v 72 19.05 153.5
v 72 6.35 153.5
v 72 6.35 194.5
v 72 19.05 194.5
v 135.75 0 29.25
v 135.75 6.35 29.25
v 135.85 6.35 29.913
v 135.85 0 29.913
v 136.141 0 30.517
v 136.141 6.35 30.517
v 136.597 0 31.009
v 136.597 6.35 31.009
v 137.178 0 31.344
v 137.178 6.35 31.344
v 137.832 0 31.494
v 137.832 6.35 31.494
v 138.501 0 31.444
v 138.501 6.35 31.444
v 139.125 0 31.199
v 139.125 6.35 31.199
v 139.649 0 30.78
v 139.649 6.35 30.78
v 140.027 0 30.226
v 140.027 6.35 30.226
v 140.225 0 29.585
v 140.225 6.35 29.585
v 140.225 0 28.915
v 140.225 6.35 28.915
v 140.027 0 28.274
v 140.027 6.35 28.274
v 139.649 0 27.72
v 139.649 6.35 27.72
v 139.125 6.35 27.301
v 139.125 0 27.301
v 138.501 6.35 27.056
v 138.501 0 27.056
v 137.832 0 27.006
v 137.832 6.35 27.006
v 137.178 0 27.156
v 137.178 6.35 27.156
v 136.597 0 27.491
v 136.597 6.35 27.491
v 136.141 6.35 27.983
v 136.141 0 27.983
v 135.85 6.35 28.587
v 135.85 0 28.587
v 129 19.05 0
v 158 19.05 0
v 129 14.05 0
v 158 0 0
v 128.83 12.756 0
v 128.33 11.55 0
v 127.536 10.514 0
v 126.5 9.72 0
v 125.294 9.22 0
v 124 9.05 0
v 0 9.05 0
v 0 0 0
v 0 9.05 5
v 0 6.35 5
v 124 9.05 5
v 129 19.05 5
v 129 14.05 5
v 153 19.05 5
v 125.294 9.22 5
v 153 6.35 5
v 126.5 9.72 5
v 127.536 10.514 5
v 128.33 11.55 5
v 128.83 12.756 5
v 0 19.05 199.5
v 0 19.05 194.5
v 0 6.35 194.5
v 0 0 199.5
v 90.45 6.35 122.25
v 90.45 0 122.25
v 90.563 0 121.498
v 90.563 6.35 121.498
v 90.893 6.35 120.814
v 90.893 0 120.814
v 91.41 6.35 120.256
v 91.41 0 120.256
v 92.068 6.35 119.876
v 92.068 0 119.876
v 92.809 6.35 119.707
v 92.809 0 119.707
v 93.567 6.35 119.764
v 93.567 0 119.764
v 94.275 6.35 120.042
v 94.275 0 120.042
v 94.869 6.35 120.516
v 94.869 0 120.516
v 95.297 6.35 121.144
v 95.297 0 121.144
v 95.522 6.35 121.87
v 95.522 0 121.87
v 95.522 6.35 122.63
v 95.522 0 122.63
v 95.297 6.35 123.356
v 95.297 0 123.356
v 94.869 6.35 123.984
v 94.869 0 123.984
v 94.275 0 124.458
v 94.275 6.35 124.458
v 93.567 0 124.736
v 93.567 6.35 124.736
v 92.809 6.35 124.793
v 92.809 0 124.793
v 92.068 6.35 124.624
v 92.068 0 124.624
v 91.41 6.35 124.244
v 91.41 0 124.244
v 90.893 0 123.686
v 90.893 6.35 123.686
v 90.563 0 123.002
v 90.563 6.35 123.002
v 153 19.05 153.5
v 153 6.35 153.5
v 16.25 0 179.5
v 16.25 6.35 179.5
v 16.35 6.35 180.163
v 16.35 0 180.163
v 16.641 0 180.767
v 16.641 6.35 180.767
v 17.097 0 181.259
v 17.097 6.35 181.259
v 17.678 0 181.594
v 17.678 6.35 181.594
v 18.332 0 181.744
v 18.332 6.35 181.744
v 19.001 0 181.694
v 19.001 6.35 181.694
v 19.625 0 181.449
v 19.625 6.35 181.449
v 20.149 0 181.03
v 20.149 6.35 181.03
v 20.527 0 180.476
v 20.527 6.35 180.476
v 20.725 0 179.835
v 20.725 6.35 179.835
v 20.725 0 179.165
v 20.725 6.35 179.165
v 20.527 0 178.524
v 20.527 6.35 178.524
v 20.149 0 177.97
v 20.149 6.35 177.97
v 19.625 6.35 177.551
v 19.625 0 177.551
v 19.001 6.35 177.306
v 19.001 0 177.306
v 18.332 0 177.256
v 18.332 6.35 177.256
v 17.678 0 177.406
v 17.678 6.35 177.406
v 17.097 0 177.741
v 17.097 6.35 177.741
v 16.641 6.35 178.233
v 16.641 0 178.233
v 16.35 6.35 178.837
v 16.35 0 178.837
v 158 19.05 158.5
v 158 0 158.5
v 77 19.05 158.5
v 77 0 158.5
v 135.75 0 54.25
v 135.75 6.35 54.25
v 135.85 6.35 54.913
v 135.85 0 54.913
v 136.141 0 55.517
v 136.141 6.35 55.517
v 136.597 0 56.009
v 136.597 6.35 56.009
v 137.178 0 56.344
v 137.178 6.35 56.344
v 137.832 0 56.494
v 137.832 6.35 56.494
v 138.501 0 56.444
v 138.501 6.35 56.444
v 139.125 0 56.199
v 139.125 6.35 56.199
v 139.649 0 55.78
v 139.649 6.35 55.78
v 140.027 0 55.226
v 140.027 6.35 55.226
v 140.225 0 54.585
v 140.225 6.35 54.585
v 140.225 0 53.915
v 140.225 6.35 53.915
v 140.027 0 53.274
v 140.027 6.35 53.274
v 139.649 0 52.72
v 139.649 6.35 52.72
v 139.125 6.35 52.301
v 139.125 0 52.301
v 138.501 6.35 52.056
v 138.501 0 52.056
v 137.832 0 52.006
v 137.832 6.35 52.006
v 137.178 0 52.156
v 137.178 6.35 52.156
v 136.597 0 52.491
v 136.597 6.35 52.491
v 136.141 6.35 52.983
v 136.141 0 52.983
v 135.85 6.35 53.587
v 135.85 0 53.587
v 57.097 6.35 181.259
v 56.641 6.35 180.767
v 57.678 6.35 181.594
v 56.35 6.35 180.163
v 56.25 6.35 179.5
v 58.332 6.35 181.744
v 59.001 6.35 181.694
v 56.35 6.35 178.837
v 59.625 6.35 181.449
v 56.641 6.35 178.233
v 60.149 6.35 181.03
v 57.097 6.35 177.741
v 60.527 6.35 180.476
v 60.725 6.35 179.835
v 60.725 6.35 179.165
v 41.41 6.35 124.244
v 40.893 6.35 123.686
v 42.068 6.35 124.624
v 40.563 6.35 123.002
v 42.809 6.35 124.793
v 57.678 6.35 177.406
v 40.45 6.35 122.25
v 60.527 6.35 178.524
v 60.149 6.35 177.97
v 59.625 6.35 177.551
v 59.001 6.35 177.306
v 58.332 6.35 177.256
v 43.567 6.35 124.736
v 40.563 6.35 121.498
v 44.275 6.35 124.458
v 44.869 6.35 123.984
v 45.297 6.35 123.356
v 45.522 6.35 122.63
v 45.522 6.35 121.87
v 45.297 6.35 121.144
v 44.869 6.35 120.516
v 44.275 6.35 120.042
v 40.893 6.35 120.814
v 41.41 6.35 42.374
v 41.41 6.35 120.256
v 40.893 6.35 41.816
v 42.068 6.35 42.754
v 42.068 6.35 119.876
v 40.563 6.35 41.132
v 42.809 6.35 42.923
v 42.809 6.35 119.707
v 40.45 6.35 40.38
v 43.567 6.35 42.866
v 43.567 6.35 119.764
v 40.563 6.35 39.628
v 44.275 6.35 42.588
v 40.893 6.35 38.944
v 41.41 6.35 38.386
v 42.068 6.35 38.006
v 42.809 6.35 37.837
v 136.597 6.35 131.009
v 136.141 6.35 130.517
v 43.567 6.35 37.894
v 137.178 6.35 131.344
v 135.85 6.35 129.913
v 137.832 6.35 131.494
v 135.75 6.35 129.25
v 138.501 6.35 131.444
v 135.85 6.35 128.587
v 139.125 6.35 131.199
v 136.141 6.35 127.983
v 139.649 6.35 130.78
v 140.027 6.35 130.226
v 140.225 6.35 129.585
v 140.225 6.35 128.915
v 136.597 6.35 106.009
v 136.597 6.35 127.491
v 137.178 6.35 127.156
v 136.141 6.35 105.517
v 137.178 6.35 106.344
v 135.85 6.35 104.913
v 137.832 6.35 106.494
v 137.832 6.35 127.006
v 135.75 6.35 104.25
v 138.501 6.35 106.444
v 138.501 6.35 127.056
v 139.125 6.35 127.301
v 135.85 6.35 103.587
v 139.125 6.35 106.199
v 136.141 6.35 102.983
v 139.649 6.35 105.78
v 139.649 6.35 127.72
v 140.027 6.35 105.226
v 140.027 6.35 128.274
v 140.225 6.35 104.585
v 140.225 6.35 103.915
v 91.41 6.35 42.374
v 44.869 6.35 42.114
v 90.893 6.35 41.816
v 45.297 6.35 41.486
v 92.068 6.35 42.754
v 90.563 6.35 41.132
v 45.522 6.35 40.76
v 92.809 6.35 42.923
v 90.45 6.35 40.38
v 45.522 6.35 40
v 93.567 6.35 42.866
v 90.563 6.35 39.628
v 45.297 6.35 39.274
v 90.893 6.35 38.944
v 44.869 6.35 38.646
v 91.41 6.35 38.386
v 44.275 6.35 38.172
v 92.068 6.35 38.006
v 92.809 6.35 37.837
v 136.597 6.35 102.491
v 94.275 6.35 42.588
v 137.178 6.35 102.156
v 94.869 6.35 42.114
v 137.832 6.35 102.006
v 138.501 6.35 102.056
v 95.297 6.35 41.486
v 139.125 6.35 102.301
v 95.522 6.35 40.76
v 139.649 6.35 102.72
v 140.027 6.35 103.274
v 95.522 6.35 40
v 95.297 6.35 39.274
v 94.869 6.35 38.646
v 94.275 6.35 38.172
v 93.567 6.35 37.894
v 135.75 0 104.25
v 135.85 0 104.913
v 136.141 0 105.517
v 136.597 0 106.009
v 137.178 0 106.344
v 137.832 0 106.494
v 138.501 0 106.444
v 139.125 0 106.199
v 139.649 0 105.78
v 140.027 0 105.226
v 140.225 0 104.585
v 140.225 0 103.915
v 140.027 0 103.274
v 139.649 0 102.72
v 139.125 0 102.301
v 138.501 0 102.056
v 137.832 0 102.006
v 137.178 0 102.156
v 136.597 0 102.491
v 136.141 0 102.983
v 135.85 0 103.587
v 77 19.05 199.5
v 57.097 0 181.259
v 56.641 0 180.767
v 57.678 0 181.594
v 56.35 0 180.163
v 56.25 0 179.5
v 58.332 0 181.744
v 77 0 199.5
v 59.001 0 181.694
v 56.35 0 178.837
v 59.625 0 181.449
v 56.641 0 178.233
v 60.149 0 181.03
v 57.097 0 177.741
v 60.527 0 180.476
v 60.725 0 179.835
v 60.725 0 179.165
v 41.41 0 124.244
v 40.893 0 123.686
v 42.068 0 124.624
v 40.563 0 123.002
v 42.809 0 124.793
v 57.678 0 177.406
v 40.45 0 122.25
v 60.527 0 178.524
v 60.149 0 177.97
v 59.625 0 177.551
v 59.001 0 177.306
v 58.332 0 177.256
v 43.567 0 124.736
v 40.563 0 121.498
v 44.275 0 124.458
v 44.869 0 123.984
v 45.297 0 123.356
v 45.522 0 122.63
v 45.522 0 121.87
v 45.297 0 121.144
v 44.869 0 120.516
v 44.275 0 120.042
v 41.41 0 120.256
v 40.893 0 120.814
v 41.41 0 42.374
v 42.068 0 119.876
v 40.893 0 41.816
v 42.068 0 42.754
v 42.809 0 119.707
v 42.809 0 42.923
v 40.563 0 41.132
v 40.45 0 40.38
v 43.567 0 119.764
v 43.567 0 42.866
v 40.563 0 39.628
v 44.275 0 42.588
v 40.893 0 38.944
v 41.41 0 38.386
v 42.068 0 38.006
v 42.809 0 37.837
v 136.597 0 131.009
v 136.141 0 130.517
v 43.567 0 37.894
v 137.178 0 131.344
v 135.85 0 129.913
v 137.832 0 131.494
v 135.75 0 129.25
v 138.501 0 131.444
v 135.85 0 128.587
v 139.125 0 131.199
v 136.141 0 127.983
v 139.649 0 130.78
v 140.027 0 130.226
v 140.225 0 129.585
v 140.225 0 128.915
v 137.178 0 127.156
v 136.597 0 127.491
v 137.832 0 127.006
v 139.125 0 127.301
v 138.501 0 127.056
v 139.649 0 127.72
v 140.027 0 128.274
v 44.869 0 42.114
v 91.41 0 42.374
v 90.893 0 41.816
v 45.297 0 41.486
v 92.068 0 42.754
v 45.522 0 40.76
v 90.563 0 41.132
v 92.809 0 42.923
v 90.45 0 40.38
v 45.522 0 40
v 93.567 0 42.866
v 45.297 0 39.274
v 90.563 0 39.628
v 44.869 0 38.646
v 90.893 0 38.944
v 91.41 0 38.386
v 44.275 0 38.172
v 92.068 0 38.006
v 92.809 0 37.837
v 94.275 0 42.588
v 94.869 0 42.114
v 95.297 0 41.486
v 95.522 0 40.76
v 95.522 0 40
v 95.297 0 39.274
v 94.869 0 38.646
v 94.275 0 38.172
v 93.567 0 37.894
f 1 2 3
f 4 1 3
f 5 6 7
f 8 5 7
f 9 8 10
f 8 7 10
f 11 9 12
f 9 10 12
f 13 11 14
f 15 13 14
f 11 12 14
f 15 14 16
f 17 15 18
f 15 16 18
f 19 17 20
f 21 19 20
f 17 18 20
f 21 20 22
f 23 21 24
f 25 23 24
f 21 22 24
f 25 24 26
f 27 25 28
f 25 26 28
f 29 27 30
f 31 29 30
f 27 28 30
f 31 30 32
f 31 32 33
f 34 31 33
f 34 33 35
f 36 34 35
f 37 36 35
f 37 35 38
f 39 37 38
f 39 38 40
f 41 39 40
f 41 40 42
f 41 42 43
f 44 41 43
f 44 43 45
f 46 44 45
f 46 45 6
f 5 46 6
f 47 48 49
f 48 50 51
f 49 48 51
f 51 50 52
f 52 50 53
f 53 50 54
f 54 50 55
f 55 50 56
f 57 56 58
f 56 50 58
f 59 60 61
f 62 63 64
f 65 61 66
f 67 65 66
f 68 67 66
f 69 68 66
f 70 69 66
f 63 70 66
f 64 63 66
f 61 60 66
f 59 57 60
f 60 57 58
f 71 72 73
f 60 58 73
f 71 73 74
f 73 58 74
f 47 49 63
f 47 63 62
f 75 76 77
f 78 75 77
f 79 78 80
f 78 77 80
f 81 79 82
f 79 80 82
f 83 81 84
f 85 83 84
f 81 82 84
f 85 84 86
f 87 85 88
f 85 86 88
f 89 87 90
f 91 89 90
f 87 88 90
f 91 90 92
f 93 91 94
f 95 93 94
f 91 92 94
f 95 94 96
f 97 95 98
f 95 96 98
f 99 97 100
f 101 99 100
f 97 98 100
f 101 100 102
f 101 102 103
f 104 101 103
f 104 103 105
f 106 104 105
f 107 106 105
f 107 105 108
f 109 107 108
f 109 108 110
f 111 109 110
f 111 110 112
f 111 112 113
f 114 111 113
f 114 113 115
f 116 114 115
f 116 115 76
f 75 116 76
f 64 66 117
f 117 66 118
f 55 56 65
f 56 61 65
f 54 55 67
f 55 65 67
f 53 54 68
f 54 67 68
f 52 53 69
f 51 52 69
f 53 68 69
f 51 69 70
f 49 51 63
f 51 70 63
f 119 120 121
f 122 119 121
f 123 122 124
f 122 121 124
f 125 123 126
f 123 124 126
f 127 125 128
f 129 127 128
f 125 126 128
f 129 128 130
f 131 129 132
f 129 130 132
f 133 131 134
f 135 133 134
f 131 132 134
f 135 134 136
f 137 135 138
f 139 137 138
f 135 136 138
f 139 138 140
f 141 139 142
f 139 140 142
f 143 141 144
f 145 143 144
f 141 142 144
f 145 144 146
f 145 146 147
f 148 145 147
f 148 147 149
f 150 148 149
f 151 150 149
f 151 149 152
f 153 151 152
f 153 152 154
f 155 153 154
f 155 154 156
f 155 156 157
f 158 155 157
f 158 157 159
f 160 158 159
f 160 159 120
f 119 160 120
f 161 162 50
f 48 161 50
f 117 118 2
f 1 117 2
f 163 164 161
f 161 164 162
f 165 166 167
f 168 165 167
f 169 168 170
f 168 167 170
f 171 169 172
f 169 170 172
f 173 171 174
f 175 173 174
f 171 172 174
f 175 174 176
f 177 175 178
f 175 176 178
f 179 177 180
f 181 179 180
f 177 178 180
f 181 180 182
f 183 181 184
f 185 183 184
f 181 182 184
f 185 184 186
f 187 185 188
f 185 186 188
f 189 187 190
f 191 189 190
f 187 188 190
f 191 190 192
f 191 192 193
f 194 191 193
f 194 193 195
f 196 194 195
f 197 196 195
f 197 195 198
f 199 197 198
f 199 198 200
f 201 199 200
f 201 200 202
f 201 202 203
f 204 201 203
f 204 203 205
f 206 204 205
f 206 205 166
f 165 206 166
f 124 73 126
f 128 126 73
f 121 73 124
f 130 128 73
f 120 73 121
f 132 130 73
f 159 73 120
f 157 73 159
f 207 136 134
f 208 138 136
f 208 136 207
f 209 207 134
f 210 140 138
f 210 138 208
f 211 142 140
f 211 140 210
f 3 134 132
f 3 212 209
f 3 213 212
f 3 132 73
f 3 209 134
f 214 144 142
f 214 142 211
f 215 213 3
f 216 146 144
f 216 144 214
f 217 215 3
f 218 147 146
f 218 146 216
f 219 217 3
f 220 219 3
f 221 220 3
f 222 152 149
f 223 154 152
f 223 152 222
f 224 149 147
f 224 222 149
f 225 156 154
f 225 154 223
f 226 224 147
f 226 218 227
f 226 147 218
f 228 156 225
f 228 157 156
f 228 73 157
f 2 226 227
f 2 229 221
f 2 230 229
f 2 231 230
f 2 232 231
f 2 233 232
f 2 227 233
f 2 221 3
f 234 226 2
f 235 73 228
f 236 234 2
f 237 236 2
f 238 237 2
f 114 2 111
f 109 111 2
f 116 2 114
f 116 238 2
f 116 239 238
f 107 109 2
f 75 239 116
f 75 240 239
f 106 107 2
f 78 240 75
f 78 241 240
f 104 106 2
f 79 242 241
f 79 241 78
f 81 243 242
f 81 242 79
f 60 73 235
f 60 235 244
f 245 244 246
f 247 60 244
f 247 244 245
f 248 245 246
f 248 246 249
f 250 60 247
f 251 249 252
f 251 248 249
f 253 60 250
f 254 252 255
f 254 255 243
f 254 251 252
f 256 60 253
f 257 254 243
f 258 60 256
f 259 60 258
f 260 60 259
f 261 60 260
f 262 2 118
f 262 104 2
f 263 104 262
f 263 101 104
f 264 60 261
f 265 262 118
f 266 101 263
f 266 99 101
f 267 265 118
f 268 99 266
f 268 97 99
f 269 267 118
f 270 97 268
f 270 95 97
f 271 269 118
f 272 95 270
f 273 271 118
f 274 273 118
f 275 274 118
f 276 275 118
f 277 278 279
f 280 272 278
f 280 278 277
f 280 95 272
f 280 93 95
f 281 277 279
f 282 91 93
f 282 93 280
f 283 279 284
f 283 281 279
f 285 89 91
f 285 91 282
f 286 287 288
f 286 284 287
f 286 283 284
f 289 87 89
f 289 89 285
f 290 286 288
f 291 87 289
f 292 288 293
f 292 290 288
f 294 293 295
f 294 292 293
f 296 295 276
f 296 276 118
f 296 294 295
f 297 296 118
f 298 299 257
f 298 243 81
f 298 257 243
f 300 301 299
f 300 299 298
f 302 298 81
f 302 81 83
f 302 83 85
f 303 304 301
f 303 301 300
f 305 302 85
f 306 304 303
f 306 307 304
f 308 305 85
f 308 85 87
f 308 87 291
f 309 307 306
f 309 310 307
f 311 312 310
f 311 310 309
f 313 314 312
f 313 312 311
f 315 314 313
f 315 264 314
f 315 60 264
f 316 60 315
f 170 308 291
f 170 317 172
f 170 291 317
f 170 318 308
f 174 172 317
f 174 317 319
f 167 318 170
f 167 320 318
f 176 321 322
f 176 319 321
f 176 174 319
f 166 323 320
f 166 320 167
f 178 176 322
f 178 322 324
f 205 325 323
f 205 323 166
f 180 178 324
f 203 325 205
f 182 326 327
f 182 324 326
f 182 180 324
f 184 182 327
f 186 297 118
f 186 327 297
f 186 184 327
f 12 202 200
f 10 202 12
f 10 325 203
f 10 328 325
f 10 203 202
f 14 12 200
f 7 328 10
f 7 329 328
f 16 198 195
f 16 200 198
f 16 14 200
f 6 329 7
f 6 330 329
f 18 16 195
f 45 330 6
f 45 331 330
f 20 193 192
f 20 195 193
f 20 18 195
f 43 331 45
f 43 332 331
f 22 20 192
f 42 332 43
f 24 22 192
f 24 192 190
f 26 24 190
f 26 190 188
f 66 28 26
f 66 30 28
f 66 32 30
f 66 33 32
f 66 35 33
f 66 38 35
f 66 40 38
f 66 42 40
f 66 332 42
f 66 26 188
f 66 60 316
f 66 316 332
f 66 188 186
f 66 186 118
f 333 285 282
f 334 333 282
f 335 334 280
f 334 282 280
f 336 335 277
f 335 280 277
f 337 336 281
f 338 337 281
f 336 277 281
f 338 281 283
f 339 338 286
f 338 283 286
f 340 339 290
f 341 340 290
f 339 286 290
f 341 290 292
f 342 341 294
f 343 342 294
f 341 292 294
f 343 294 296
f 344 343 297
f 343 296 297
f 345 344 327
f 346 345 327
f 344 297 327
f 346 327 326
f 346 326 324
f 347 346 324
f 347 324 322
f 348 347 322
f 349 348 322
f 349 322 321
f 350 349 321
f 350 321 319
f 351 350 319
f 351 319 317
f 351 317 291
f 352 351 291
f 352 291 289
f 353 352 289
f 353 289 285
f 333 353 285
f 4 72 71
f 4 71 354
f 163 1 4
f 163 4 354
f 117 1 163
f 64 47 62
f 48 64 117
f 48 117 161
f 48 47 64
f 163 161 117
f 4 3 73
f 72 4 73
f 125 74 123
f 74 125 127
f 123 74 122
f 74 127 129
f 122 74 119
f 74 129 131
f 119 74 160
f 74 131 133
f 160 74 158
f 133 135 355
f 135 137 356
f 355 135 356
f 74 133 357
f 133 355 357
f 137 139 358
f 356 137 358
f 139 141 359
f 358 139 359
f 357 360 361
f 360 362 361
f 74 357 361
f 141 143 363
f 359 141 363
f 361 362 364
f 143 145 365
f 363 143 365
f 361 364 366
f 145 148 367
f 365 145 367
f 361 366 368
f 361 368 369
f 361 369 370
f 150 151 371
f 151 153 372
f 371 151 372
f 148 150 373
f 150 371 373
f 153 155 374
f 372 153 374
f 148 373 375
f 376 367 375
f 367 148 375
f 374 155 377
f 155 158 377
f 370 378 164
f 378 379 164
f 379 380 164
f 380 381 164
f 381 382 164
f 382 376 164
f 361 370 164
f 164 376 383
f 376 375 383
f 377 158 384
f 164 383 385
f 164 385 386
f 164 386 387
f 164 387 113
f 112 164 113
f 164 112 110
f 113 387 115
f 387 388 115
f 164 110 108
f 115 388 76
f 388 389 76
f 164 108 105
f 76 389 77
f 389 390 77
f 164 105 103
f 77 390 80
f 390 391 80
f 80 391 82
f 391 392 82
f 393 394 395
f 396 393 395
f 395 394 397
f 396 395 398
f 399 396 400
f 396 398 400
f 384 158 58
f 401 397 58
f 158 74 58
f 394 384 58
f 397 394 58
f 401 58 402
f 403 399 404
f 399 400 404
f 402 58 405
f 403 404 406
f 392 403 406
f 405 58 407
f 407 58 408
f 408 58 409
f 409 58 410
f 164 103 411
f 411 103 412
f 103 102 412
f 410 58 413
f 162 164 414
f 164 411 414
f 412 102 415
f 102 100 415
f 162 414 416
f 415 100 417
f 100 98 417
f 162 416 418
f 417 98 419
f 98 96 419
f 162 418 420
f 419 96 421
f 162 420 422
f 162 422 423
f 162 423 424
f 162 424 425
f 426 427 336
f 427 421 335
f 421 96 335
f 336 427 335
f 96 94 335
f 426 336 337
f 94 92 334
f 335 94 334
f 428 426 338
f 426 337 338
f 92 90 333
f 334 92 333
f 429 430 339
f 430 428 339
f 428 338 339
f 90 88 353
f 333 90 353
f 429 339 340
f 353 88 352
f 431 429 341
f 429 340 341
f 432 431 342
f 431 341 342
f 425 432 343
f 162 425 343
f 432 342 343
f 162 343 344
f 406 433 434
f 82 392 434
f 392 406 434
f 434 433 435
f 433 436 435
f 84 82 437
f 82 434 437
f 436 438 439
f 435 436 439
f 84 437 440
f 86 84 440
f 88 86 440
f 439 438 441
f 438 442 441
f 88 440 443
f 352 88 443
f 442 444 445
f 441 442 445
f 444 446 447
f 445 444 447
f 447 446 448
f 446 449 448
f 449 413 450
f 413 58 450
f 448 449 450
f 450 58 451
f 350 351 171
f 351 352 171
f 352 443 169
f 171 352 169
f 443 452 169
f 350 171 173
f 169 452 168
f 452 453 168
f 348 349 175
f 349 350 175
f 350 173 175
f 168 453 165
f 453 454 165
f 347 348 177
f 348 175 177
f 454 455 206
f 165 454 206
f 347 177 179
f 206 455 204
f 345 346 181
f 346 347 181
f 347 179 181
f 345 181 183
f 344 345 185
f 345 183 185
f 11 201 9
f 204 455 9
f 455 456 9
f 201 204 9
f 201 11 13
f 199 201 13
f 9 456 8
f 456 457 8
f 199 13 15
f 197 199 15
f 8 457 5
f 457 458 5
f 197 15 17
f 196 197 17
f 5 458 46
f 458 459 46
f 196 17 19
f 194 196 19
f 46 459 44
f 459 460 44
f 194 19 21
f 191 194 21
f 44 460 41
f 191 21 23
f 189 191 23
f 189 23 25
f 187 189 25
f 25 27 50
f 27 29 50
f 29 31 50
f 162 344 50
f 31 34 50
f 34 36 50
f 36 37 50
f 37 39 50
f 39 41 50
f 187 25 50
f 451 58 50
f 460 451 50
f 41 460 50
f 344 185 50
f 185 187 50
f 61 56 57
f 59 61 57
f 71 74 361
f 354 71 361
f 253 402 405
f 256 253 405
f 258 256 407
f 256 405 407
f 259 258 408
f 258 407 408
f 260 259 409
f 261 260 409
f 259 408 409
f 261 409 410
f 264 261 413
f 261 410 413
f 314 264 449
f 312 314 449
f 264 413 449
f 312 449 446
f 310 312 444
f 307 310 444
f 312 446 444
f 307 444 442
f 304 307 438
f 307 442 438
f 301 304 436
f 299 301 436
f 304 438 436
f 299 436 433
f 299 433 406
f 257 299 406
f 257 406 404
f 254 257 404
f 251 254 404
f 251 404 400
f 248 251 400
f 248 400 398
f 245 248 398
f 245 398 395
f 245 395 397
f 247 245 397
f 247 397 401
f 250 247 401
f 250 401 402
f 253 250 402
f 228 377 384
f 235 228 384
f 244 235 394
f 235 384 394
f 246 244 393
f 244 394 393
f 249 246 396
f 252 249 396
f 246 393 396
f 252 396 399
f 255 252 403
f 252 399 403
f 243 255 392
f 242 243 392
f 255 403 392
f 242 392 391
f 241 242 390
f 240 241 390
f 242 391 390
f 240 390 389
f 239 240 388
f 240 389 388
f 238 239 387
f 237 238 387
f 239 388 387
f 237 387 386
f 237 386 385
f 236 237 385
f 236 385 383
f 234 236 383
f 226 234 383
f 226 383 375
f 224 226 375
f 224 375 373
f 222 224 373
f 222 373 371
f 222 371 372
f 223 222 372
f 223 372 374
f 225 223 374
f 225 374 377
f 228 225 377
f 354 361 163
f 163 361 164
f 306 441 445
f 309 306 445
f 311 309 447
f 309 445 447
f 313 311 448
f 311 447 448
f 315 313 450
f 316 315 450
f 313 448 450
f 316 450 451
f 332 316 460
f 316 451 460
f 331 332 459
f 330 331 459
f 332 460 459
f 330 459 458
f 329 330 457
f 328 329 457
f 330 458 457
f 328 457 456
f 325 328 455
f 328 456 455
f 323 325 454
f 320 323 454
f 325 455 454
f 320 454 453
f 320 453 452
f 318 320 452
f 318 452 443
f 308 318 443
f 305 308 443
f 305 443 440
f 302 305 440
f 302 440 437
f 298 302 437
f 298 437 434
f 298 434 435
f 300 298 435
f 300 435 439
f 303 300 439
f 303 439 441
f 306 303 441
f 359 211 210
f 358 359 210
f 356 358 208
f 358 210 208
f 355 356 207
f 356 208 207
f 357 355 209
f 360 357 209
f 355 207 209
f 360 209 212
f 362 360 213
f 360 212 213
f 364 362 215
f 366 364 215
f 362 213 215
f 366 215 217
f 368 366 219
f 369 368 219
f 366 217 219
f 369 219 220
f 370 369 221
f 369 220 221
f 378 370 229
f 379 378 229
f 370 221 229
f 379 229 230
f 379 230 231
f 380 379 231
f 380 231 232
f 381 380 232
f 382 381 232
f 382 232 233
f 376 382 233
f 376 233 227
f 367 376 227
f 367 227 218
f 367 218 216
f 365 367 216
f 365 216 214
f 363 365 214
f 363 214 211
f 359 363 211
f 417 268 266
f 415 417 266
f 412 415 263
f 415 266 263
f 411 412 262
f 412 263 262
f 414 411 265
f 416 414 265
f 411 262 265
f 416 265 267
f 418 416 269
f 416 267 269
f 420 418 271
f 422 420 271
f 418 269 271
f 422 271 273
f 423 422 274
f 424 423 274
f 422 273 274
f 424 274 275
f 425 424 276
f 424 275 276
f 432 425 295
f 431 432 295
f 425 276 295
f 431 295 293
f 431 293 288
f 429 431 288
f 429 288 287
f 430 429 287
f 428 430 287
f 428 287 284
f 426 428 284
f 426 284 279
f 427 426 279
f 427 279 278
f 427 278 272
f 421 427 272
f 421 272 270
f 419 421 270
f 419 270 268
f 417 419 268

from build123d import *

# Parameters (mm, degrees)
SKETCH1_W                      = 158
SKETCH1_H                      = 199.5
BOSS_EXTRUDE1_DEPTH            = 6.35
SKETCH2_W                      = 81
SKETCH2_H                      = 41
CUT_EXTRUDE1_DEPTH             = 7.35
BOSS_EXTRUDE2_DEPTH            = 12.7
M4_CLEARANCE_HOLE1_D           = 4.5
M4_CLEARANCE_HOLE1_DEPTH       = 6.35
CUT_EXTRUDE2_REACH             = 201.5
SKETCH7_W                      = 129
SKETCH7_H                      = 10
FILLET1_R                      = 5
F_5_1_5_1_DIAMETER_HOLE1_D     = 5.1
F_5_1_5_1_DIAMETER_HOLE1_DEPTH = 6.35


with BuildPart() as part:
    # Sketch1 → Boss-Extrude1 (new body)
    with BuildSketch(Plane(origin=(0, 0, 0), x_dir=(1, 0, 0), z_dir=(0, 1, 0))):
        with Locations((79, -99.75)):
            Rectangle(SKETCH1_W, SKETCH1_H)
    extrude(amount=BOSS_EXTRUDE1_DEPTH)

    # Sketch2 → Cut-Extrude1 (cut, through all)
    with BuildSketch(Plane(origin=(0, 6.35, 0), x_dir=(1, 0, 0), z_dir=(0, 1, 0))):
        with Locations((117.5, -179)):
            Rectangle(SKETCH2_W, SKETCH2_H)
    extrude(amount=-CUT_EXTRUDE1_DEPTH, mode=Mode.SUBTRACT)

    # Sketch3 → Boss-Extrude2 (add)
    with BuildSketch(Plane(origin=(0, 6.35, 0), x_dir=(1, 0, 0), z_dir=(0, 1, 0))):
        Polygon((0, 0), (0, -5), (153, -5), (153, -153.5), (72, -153.5), (72, -194.5), (0, -194.5), (0, -199.5), (72, -199.5), (77, -199.5), (77, -158.5), (158, -158.5), (158, 0), align=None)
    extrude(amount=BOSS_EXTRUDE2_DEPTH)

    # M4 Clearance Hole1
    with Locations(Plane.XZ):
        with Locations((138, 54.25), (18.5, 179.5), (58.5, 179.5), (138, 129.25), (138, 104.25), (138, 29.25)):
            Hole(M4_CLEARANCE_HOLE1_D / 2, depth=M4_CLEARANCE_HOLE1_DEPTH)

    # Sketch7 → Cut-Extrude2 (cut, up to next)
    with BuildSketch(Plane(origin=(0, 0, 0), x_dir=(-1, 0, 0), z_dir=(0, 0, -1)), mode=Mode.PRIVATE) as cut_extrude2_sk1:
        with Locations((-64.5, 14.05)):
            Rectangle(SKETCH7_W, SKETCH7_H)
    cut_extrude2_tool1 = extrude(cut_extrude2_sk1.sketch, amount=-CUT_EXTRUDE2_REACH, mode=Mode.PRIVATE) & part.part
    add(cut_extrude2_tool1.solids().sort_by_distance((64.5, 14.05, 0))[0], mode=Mode.SUBTRACT)

    # Fillet1
    fillet1_edges = [part.edges().sort_by_distance(p)[0] for p in [
        (129, 9.05, 2.5),
    ]]
    fillet(fillet1_edges, radius=FILLET1_R)

    # Ø5.1 (5.1) Diameter Hole1
    with Locations(Plane(origin=(0, 6.35, 0), x_dir=(1, 0, 0), z_dir=(0, 1, 0))):
        with Locations((43, -40.38), (43, -122.25), (93, -122.25), (93, -40.38)):
            Hole(F_5_1_5_1_DIAMETER_HOLE1_D / 2, depth=F_5_1_5_1_DIAMETER_HOLE1_DEPTH)


solid = part.part
